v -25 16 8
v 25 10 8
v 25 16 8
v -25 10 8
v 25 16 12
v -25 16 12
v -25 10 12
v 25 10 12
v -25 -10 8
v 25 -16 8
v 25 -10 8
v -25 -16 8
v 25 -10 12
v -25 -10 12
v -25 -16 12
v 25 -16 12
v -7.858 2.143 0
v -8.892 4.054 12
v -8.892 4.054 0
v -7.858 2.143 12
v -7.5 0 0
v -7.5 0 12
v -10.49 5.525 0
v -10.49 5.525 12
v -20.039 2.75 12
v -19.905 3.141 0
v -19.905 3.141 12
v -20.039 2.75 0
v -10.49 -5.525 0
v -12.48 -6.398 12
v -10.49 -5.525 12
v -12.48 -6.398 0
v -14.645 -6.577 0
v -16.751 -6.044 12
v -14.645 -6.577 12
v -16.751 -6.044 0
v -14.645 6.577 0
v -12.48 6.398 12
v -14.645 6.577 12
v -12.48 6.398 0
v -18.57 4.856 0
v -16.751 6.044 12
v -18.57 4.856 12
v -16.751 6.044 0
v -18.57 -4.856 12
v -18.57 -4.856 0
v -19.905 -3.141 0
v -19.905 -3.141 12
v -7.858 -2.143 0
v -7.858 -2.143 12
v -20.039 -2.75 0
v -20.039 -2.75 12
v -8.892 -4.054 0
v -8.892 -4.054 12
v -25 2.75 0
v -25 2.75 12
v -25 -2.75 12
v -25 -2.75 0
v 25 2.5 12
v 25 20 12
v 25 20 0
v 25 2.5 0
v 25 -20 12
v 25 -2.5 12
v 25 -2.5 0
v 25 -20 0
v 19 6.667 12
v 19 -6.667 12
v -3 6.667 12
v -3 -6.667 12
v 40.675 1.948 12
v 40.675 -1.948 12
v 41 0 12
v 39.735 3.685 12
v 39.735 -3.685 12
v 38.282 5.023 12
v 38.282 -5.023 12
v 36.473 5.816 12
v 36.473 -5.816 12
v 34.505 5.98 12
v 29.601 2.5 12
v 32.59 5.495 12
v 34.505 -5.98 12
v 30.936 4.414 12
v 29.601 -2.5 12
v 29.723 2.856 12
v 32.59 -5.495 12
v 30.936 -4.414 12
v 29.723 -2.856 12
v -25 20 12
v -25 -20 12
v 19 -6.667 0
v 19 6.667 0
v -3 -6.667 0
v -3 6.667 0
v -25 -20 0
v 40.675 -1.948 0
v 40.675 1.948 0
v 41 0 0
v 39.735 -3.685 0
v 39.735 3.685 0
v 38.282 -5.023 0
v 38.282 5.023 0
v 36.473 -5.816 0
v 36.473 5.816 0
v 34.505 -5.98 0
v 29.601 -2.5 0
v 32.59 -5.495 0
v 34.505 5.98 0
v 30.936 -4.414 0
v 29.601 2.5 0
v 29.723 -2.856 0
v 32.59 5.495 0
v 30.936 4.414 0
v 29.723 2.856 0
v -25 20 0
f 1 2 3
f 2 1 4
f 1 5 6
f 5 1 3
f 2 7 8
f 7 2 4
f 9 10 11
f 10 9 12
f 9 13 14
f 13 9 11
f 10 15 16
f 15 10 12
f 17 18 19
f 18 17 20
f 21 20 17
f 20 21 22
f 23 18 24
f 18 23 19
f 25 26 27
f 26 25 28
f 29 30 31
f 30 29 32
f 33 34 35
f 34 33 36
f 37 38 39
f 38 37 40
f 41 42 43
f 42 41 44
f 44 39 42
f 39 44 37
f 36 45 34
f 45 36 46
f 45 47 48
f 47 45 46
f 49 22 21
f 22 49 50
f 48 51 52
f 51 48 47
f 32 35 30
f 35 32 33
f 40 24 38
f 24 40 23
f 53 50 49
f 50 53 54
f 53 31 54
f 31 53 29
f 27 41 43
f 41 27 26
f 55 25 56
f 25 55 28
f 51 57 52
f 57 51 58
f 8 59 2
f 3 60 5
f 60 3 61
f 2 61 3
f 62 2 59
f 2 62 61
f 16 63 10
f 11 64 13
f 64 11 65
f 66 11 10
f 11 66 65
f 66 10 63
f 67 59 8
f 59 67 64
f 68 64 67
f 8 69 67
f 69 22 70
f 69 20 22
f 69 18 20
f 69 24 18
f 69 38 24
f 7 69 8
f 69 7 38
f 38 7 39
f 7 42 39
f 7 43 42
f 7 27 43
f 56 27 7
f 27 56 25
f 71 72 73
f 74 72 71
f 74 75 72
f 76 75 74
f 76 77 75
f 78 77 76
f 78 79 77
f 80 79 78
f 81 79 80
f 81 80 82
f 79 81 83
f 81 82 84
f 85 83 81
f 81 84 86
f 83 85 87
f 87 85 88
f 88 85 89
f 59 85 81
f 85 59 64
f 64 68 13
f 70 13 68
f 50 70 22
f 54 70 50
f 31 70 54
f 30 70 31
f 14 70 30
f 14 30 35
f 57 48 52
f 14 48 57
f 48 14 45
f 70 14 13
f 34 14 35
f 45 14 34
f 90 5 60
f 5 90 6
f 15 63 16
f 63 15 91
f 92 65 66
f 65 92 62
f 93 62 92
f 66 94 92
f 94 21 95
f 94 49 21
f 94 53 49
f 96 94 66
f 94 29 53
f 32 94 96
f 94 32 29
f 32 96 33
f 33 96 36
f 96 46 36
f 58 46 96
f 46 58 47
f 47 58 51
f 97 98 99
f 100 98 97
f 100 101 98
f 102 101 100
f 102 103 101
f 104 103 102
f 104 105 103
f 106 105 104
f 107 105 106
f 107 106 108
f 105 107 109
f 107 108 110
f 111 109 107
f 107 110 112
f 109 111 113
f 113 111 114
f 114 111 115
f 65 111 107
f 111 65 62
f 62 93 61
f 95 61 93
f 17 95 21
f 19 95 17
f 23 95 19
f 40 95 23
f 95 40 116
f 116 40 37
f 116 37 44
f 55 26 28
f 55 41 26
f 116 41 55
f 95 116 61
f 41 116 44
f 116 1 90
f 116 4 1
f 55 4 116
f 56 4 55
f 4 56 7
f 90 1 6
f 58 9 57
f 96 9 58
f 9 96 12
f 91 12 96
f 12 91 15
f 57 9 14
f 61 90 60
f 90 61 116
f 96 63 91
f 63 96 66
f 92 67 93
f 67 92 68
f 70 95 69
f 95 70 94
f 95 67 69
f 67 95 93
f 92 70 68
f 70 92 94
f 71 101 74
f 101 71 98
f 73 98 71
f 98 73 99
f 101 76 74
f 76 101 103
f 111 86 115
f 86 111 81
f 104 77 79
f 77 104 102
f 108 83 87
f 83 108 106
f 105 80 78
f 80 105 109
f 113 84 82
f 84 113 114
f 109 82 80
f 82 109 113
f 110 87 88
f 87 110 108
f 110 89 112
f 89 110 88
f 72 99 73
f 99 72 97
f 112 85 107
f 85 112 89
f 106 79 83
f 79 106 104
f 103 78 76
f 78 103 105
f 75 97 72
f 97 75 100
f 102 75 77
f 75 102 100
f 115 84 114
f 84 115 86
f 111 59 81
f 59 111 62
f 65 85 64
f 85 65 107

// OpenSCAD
/**
Parts Library for Lillabo Train Set from Ikea.
(Also compatible with Brio sets)

by Gary Hodgson

*/

/* indexes */
l=0;
w=1;
h=2;
d=0;

/* Track Dimensions*/
track_height = 12;
track_width = 40;
rut_spacing = 20;
rut_width = 6;
rut_depth = 4;
track_length_short = 50;
track_length_medium = 150;
track_length_long = 202;
double_tracks = [[16,3],[10,3],[10,6],[-10,6],[-10,3],[-16,3],[-16,6],[-20,6],[-20,-6],[-16,-6],[-16,-3],[-10,-3],[-10,-6],[10,-6],[10,-3],[16,-3],[16,-6],[20,-6],[20,6],[16,6]];
single_tracks = [[16,3],[10,3],[10,6],[-10,6],[-10,3],[-16,3],[-16,6],[-20,6],[-20,-6],[20,-6],[20,6],[16,6]];

/* Curved Track Dimensions*/
track_inner_circumference = 135*8;
track_inner_diameter = track_inner_circumference/ 3.1415;
track_inner_radius = track_inner_diameter/2;
track_center_radius = track_inner_radius + track_width/2;
track_outer_radius = track_inner_radius + track_width;
track_cutout_height = 20;
track_cutout_width = 10;

/* Other Dimensions*/
peg_pin_dia = 12;
peg_dims = [16, peg_pin_dia, track_height];
block_dims = [56,33,63];
tolerance = 0.1;

lightweight_default=true;

//buffer();
//set();
//curved_track();
short_track();
//medium_track();
//long_track();
//track_set();
//peg();
//hole();
//block();

module buffer() {
	post_height=25;
	post_diameter=10;

	translate([0, 0, post_diameter/2])
	rotate([0,-90,0]) {

		track(10, ruts=false, b="none", lightweight=false);
		
		translate([0, track_width/4, post_height/2])
			cylinder(r=post_diameter/2, h=post_height, center=true);

		translate([0, -track_width/4, post_height/2])
			cylinder(r=post_diameter/2, h=post_height, center=true);

		translate([0, 0, post_height])
			cube([10, track_width, 10], center=true);

		translate([7, 0, post_height])
		rotate([0,90,0])
			cylinder(r=post_diameter/2, h=5, center=true);
		translate([11, 0, post_height])
		rotate([0,90,0])
			cylinder(r1=post_diameter/2,r2=post_diameter/1.5, h=3, center=true);
	}
}

module set() {
	translate([-track_width*2, 0, 0])
		curved_track(lightweight=true);
	translate([0, -track_width*2, 0])
		short_track();
	translate([0, -track_width*4, 0])
		medium_track();
	translate([0, -track_width*6, 0])
		long_track();
	translate([0, -track_width*8, 0])
		track(50, a="peg", b="peg", lightweight=true);
	translate([0, -track_width*10, 0])
		track(50, a="hole", b="hole", lightweight=true);
	translate([track_width, 0, 0])
		peg();
	translate([track_width*2, 0, 0])
		hole();
	translate([track_width, track_width*2, 0])
		block();
}

module track_set() {
	xx = 50;
	track(xx, a="peg", b="peg", lightweight=true);
	translate([0,50,0])
	track(xx, a="hole", b="hole", lightweight=true);
	translate([0,100,0])
	track(xx, a="peg", b="hole", lightweight=true);
	translate([0,150,0])
	track(xx, a="hole", b="peg", lightweight=true);
}

/**
* a/b = connectors, either: peg, hole, or none
*/
module curved_track(a="hole", b="hole", lightweight=lightweight_default) {
	
	function a_offset(peg_or_hole) = peg_or_hole=="hole" ? -7 : -3;
	function b_offset(peg_or_hole) = peg_or_hole=="hole" ? -7 : -3;

	translate([track_center_radius, 0, 0]) {
		difference(){
			rotate_extrude($fn=200)
				translate([track_center_radius, 0, 0])
					polygon(double_tracks);

			translate([0, -track_outer_radius, -(track_height+1)/2])
				cube([track_outer_radius+1, (track_outer_radius+1)*2, track_height+2]);

			translate([-track_outer_radius, -track_outer_radius, -(track_height+1)/2])
				cube([track_outer_radius+1, track_outer_radius, track_height+2]);

			rotate([0,0,180+45])			
			translate([-track_outer_radius, -track_outer_radius, -(track_height+1)/2])
				cube([track_outer_radius+1, track_outer_radius, track_height+2]);

			if (b=="hole"){
				translate([-track_center_radius, -tolerance, -(track_height+2)/2])
				rotate([0,0,90])
					hole();
			}
			if (a == "hole"){
				rotate([0,0,45])
				translate([0, track_center_radius, -track_height/2])
				rotate([0,0,180])
					hole();
			}

			if (lightweight){
				
				difference(){
					rotate_extrude($fn=200)
						translate([track_center_radius, 0, 0])
							square(size=[track_cutout_width, track_cutout_height], center=true);

					translate([0, -track_outer_radius, -(track_cutout_height+1)/2])
						cube([track_outer_radius+1, (track_outer_radius+1)*2, track_cutout_height+2]);

					rotate([0,0,b_offset(b)])
					translate([-track_outer_radius, -track_outer_radius, -(track_cutout_height+1)/2])
						cube([track_outer_radius+1, track_outer_radius+1, track_cutout_height+2]);

					rotate([0,0,180+(45-a_offset(a))])
					translate([-track_outer_radius, -track_outer_radius, -(track_cutout_height+1)/2])
						cube([track_outer_radius+1, track_outer_radius+1, track_cutout_height+2]);

				}
			}
		}

		if (a == "peg"){
			rotate([0,0,45.5])
				translate([0, track_center_radius, -track_height/2]) 
					peg();
		}

		if (b == "peg"){			
			translate([-track_center_radius, 0, -track_height/2]) 
			rotate([0,0,-90])
					peg();
		}
	}
}

module long_track(lightweight=lightweight_default) {
	track(track_length_long, lightweight=lightweight);
}

module medium_track(lightweight=lightweight_default) {
	track(track_length_medium, lightweight=lightweight);
}

module short_track(lightweight=lightweight_default) {
	track(track_length_short, lightweight=lightweight);
}

/**
* a/b = connectors, either: peg, hole, or none
*/
module track(length, a="peg", b="hole", lightweight=lightweight_default, ruts=true) {

	function a_offset(peg_or_hole) = peg_or_hole=="hole" ? -peg_dims[l] + 8 : 0;
	function b_offset(peg_or_hole) = peg_or_hole=="hole" ? peg_dims[l] - 8 : 0;
	function lw_offset(peg_or_hole) = peg_or_hole=="hole" ? peg_dims[l] + 6 : 6;

	difference(){
		translate([0,0,track_height/2])
			cube(size=[length, track_width, track_height], center=true);

		if (ruts){
			translate([0,rut_spacing/2+rut_width/2,track_height+1-rut_depth/2])
				cube(size=[length+2, rut_width, rut_depth+2], center=true);

			translate([0,-(rut_spacing/2+rut_width/2),track_height+1-rut_depth/2])
				cube(size=[length+2, rut_width, rut_depth+2], center=true);
		}

		if (b=="hole"){
			translate([-(length/2)-0.1,0,-1])
				hole();
		}
		if (a == "hole"){
			rotate([0,0,180])
			translate([-((length+0.5)/2), 0, -1]) 
				hole();
		}

		if (lightweight){
			translate([0+a_offset(a)+b_offset(b), 0,track_height/2])
				cube([length-(lw_offset(a)+lw_offset(b)), rut_spacing/1.5, track_height+2], center=true);
		}
	}

	if (a=="peg"){
		translate([length/2,0,0])
			peg();
	}
	if (b=="peg"){
		translate([-length/2,0,0])
		rotate([0,0,180])
			peg();
	}
	
}

module hole() {
	scale([1 + tolerance,1 + tolerance,1 + (tolerance*2)])
		peg();
}

module peg() {
	
	pin_connector_dims = [peg_dims[l]-(peg_pin_dia/2), 5, peg_dims[h]];

	translate([pin_connector_dims[l],0,0])
		cylinder(r=peg_pin_dia/2, h=peg_dims[h]);

	translate([0,-(pin_connector_dims[w]/2),0])
		cube(size=pin_connector_dims);
}

module block(lightweight=lightweight_default) {
	top_cutout_dims = [8, block_dims[w], 11];
	bottom_cutout_dims = [42, block_dims[w], 11];

	translate([0,0,block_dims[w]/2])
	rotate([-90,0,0])
	difference(){
		cube(size=block_dims, center=true);
		
		translate([block_dims[l]/2 - top_cutout_dims[l]/2, 0, block_dims[h]/2 - top_cutout_dims[h]/2])
			cube(size=top_cutout_dims, center=true);

		translate([-block_dims[l]/2 + top_cutout_dims[l]/2, 0, block_dims[h]/2 - top_cutout_dims[h]/2])
			cube(size=top_cutout_dims, center=true);

		translate([0, 0, -block_dims[h]/2 + bottom_cutout_dims[h]/2])
			cube(size=bottom_cutout_dims, center=true);	


		if (lightweight){
			translate([0, 0, 5]) 
				cube([block_dims[l]-30,block_dims[w]+2,block_dims[h]-25], center=true);

			translate([0, 0, 0]) 
				cube([block_dims[l]-12, block_dims[w]+2,block_dims[h]-34], center=true);

		}
	}
}
